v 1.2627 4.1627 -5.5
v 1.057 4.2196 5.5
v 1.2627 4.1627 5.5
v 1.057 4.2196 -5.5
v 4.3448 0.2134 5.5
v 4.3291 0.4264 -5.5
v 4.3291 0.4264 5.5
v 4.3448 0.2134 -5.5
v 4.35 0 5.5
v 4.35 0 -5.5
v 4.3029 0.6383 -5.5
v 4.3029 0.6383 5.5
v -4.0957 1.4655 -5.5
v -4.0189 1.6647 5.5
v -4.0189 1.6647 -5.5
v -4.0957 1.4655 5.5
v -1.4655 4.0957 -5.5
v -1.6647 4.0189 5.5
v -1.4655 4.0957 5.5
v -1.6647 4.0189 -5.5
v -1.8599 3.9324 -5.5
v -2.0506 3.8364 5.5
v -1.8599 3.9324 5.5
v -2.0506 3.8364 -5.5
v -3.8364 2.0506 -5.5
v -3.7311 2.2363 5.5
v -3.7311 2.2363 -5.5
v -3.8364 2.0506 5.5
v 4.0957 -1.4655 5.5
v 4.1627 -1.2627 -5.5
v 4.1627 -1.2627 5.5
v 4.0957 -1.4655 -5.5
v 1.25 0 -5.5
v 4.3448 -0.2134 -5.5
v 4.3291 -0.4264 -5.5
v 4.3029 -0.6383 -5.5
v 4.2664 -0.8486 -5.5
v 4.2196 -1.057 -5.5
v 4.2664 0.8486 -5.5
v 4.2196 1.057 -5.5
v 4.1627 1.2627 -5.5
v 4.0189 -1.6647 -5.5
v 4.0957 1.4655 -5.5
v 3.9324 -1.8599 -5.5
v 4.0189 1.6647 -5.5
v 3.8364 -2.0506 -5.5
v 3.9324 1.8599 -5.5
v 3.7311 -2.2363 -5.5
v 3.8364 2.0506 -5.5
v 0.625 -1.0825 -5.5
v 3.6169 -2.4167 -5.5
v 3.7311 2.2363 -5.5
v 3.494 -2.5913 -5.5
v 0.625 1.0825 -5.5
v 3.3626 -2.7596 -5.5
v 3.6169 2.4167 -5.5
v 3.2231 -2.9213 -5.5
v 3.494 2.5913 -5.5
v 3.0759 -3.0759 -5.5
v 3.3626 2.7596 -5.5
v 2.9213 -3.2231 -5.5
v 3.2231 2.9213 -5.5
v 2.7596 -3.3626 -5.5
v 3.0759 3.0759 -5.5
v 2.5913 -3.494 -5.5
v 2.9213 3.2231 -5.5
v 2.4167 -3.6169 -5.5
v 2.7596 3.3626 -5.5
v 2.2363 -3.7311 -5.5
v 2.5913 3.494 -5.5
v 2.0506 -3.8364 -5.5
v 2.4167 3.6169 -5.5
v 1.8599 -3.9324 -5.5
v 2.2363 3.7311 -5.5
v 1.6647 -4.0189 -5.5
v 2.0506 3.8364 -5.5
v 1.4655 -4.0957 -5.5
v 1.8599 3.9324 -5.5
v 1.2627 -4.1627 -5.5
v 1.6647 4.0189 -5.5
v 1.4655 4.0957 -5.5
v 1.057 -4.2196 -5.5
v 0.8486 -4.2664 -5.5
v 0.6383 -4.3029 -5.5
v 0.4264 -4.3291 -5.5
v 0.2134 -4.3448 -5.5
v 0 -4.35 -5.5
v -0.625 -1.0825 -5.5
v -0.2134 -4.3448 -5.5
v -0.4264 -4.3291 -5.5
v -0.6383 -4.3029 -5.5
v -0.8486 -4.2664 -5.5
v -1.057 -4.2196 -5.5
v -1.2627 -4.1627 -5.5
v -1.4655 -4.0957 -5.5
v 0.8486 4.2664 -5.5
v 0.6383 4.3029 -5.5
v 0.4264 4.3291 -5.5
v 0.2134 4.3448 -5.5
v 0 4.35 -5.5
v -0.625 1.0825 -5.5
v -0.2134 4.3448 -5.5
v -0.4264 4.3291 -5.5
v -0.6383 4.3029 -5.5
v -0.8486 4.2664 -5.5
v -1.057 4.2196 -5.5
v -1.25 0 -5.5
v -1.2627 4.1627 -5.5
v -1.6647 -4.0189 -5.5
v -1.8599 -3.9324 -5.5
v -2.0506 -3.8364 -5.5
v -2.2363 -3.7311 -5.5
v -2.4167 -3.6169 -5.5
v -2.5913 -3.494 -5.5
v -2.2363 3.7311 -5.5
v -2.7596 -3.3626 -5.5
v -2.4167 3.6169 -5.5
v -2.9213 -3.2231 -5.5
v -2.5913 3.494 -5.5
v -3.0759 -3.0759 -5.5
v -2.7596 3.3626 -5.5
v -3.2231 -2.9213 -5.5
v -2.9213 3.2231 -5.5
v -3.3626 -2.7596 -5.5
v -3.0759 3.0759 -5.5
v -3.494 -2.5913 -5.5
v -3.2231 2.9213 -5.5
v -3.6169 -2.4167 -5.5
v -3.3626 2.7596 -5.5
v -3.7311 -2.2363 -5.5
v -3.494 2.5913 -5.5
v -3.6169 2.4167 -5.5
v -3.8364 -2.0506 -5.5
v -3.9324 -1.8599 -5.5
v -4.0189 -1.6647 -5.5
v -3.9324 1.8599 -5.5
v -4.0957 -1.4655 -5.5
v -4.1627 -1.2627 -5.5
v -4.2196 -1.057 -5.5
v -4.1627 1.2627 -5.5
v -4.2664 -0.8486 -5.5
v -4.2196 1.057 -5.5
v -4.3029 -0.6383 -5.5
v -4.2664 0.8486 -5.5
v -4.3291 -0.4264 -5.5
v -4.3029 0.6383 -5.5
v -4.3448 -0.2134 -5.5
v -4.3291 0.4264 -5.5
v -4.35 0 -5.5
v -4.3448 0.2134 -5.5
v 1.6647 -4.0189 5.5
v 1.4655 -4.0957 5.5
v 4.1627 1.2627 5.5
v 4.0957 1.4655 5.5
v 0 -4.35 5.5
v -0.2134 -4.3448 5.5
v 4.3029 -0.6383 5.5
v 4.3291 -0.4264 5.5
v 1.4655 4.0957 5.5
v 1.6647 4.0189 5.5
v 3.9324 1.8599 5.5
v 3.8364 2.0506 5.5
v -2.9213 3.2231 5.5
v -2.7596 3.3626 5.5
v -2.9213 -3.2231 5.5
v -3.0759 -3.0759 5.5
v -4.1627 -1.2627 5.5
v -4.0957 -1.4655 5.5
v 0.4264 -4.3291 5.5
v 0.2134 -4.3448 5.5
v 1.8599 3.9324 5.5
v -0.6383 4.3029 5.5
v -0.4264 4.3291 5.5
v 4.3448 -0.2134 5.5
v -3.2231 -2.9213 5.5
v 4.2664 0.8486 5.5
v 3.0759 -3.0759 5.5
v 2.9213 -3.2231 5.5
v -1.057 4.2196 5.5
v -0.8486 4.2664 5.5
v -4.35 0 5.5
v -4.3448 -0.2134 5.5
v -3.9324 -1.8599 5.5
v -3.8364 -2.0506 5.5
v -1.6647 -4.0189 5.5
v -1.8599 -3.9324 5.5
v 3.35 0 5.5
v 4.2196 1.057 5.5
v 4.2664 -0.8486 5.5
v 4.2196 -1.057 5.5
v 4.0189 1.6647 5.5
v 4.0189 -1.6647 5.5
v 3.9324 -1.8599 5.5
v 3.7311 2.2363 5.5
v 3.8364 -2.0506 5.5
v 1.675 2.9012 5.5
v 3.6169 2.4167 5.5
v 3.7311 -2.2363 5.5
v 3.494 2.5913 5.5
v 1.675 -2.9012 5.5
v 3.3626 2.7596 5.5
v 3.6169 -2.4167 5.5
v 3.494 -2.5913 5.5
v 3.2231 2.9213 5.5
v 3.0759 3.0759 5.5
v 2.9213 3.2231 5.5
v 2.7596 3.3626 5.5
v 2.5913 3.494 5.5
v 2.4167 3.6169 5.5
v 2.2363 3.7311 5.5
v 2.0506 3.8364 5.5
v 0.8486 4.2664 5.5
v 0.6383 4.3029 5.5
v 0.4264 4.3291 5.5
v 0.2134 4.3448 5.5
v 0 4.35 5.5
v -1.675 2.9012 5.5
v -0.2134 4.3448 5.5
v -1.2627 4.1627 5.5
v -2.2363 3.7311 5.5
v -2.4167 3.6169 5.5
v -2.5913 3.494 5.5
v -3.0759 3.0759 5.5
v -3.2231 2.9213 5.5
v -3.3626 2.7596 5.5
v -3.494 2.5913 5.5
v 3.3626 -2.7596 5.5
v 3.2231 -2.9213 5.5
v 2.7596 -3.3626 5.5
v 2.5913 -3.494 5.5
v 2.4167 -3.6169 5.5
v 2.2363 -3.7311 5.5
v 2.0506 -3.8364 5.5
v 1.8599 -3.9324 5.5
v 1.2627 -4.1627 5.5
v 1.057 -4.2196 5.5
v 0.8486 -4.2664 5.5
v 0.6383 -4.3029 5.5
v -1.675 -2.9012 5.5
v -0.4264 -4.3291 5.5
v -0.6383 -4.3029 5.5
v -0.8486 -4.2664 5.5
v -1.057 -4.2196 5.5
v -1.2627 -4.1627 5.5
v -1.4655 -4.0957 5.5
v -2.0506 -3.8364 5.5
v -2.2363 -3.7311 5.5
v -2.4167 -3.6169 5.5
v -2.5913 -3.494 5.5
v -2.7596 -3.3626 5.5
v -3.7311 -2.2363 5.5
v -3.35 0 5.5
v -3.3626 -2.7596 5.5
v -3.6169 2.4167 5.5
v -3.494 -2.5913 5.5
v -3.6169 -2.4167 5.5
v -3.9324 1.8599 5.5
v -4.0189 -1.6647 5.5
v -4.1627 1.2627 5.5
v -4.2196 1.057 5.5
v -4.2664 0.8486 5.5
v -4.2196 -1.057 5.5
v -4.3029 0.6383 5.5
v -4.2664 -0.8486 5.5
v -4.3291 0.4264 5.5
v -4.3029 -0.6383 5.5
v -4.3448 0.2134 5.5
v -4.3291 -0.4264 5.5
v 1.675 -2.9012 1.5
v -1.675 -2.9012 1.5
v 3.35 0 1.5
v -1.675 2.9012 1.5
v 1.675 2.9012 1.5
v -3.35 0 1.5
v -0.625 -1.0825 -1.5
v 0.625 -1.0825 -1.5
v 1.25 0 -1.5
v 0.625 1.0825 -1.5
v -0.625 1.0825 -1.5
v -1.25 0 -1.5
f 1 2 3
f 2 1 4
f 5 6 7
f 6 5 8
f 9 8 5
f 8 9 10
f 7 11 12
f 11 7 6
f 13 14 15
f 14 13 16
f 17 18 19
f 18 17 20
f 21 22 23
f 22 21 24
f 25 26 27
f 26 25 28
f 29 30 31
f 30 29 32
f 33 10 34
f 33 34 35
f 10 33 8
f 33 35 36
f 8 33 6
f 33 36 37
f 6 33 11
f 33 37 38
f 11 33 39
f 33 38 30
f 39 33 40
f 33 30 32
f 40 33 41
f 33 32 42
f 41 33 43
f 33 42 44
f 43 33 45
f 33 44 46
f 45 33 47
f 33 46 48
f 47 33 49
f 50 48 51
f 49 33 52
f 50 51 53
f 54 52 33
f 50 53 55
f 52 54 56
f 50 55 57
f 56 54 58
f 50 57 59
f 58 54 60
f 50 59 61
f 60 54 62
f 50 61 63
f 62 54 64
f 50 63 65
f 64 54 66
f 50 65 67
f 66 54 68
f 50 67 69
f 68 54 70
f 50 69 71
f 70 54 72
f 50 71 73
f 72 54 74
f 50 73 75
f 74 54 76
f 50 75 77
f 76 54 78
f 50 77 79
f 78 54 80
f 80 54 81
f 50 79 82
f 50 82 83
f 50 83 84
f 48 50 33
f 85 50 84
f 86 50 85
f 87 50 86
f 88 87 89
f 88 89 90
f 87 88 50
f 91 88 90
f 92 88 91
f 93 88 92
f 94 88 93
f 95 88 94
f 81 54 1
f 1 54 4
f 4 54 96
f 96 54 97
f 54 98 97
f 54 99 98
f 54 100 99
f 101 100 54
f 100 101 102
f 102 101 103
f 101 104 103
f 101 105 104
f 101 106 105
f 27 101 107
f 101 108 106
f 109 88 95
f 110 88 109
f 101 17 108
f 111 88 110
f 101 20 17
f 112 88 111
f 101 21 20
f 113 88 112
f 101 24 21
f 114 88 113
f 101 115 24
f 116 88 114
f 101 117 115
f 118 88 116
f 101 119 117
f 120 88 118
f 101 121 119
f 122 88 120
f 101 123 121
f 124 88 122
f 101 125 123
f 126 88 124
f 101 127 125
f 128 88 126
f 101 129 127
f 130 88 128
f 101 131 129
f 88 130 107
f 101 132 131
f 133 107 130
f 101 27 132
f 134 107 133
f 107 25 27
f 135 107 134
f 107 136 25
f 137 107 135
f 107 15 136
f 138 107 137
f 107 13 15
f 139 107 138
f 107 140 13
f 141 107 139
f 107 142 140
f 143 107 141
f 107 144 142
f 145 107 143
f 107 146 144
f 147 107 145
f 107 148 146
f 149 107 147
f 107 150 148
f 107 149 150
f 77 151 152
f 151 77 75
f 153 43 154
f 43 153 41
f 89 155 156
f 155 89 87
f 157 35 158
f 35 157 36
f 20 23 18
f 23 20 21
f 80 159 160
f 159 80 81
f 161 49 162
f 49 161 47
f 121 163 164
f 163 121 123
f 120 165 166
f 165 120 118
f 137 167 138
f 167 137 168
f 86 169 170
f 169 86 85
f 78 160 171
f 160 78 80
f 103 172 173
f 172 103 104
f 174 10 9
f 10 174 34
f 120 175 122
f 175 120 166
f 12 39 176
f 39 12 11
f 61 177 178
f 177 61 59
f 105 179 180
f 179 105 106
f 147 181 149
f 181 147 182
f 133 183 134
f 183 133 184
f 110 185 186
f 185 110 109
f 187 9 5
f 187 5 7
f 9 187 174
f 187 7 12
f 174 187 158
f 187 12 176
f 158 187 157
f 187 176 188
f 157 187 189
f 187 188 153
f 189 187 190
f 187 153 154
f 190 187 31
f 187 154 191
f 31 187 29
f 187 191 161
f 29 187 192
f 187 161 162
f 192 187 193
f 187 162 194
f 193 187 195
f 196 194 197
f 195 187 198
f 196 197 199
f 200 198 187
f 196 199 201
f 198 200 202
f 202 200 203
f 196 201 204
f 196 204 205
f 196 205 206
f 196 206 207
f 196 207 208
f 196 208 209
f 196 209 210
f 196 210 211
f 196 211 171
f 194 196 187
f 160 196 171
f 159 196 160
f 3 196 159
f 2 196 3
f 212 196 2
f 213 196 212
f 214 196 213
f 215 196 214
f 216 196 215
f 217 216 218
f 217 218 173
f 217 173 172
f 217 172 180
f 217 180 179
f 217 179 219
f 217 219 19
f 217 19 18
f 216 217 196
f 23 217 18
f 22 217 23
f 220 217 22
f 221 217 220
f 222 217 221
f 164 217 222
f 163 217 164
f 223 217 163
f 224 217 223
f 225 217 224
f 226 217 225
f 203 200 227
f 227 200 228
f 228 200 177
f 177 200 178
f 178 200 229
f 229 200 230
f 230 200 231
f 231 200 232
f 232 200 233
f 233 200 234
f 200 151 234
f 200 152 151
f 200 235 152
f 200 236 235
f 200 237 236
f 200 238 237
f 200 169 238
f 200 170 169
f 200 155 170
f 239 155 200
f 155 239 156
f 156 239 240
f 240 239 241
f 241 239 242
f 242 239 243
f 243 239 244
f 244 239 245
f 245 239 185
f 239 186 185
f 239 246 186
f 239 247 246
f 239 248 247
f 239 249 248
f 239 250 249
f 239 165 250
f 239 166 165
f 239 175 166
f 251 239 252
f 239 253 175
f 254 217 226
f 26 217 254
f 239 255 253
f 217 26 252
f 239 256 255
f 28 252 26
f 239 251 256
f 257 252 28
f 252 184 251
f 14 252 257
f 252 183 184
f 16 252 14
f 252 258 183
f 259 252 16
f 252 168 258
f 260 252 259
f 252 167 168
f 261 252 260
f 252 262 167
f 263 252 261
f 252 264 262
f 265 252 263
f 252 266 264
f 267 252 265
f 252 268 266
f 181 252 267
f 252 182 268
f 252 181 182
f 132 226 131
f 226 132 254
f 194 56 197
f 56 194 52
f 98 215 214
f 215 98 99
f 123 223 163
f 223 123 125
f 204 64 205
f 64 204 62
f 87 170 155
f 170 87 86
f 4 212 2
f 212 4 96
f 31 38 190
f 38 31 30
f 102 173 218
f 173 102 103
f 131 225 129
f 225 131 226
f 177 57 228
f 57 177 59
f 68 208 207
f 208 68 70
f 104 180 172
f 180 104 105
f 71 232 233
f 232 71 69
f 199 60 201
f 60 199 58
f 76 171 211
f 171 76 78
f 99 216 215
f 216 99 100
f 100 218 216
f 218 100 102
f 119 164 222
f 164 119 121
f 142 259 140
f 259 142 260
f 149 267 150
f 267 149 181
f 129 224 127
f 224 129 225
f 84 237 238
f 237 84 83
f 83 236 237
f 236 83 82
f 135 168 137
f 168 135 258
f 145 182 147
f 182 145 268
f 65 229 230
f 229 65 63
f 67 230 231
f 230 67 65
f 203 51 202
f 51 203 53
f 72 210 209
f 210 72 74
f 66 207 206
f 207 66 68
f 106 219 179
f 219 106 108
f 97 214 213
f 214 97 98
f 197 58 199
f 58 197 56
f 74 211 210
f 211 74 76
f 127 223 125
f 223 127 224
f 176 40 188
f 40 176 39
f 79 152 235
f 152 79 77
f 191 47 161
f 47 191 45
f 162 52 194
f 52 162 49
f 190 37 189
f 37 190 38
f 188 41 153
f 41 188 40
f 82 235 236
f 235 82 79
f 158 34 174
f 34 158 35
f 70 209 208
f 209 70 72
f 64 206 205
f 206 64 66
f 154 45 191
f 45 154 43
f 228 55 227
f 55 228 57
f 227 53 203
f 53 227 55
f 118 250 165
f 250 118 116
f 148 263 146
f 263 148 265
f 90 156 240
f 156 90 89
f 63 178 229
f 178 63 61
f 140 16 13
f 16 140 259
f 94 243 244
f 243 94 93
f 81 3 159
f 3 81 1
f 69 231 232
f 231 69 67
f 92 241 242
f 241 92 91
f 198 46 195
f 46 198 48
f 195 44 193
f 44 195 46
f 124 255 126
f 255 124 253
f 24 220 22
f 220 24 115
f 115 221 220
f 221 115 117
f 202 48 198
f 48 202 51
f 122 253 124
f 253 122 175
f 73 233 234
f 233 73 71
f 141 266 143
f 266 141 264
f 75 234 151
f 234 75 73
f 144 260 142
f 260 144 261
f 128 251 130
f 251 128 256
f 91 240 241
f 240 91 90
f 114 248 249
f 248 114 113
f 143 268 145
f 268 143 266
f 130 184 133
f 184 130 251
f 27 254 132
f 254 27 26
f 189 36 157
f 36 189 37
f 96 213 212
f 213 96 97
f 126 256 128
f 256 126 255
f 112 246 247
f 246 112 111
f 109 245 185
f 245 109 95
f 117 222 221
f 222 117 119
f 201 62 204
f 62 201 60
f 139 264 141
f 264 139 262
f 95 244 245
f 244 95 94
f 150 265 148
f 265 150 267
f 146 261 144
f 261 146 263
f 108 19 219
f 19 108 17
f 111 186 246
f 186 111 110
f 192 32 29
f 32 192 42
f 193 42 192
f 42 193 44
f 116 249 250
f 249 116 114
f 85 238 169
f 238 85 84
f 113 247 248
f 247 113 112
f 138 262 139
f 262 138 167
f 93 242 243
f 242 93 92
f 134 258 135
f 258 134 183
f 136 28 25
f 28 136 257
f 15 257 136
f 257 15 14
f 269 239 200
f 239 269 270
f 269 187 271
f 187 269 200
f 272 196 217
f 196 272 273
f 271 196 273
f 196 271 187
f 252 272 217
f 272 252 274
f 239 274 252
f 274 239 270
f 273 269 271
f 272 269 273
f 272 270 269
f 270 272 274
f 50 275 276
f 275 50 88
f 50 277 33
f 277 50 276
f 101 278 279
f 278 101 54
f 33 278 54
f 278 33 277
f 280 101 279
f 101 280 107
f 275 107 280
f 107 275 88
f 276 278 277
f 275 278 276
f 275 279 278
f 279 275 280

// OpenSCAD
// Simple nutdriver example -- Al Williams

// Type of shaft
$fn=128;  // [6:hex, 128:round]
// Size of nut (a little larger than the nut is good)
nutsize=6.2;
// Size of hex driver side -- should be tight
hexsize=2;
// Size of wall around nut
wall=1;
// Socket height
sock_height=4;
// Drive height
drive_height=4;
// Gap between drive and socket
gap=3;

// Scale up holes by factor if your printer/slicer makes holes small
holescale=1;
// Add a bit to holes if your printer/slicer makes holes small (make negative if they come out big)
holeoffset=0.5;

nut_size=nutsize*holescale+holeoffset;
hex_size=hexsize*holescale+holeoffset;

difference()
{
   translate([0,0,-(drive_height+gap/2)]) cylinder(d=nut_size+2*wall,h=sock_height+drive_height+gap,center=false);
   translate([0,0,gap/2]) cylinder(d=nut_size,$fn=6,h=sock_height+2,center=false);
   translate([0,0,-(drive_height+gap/2+2)])
      cylinder(d=hex_size,$fn=6,h=drive_height+2,center=false);
}
